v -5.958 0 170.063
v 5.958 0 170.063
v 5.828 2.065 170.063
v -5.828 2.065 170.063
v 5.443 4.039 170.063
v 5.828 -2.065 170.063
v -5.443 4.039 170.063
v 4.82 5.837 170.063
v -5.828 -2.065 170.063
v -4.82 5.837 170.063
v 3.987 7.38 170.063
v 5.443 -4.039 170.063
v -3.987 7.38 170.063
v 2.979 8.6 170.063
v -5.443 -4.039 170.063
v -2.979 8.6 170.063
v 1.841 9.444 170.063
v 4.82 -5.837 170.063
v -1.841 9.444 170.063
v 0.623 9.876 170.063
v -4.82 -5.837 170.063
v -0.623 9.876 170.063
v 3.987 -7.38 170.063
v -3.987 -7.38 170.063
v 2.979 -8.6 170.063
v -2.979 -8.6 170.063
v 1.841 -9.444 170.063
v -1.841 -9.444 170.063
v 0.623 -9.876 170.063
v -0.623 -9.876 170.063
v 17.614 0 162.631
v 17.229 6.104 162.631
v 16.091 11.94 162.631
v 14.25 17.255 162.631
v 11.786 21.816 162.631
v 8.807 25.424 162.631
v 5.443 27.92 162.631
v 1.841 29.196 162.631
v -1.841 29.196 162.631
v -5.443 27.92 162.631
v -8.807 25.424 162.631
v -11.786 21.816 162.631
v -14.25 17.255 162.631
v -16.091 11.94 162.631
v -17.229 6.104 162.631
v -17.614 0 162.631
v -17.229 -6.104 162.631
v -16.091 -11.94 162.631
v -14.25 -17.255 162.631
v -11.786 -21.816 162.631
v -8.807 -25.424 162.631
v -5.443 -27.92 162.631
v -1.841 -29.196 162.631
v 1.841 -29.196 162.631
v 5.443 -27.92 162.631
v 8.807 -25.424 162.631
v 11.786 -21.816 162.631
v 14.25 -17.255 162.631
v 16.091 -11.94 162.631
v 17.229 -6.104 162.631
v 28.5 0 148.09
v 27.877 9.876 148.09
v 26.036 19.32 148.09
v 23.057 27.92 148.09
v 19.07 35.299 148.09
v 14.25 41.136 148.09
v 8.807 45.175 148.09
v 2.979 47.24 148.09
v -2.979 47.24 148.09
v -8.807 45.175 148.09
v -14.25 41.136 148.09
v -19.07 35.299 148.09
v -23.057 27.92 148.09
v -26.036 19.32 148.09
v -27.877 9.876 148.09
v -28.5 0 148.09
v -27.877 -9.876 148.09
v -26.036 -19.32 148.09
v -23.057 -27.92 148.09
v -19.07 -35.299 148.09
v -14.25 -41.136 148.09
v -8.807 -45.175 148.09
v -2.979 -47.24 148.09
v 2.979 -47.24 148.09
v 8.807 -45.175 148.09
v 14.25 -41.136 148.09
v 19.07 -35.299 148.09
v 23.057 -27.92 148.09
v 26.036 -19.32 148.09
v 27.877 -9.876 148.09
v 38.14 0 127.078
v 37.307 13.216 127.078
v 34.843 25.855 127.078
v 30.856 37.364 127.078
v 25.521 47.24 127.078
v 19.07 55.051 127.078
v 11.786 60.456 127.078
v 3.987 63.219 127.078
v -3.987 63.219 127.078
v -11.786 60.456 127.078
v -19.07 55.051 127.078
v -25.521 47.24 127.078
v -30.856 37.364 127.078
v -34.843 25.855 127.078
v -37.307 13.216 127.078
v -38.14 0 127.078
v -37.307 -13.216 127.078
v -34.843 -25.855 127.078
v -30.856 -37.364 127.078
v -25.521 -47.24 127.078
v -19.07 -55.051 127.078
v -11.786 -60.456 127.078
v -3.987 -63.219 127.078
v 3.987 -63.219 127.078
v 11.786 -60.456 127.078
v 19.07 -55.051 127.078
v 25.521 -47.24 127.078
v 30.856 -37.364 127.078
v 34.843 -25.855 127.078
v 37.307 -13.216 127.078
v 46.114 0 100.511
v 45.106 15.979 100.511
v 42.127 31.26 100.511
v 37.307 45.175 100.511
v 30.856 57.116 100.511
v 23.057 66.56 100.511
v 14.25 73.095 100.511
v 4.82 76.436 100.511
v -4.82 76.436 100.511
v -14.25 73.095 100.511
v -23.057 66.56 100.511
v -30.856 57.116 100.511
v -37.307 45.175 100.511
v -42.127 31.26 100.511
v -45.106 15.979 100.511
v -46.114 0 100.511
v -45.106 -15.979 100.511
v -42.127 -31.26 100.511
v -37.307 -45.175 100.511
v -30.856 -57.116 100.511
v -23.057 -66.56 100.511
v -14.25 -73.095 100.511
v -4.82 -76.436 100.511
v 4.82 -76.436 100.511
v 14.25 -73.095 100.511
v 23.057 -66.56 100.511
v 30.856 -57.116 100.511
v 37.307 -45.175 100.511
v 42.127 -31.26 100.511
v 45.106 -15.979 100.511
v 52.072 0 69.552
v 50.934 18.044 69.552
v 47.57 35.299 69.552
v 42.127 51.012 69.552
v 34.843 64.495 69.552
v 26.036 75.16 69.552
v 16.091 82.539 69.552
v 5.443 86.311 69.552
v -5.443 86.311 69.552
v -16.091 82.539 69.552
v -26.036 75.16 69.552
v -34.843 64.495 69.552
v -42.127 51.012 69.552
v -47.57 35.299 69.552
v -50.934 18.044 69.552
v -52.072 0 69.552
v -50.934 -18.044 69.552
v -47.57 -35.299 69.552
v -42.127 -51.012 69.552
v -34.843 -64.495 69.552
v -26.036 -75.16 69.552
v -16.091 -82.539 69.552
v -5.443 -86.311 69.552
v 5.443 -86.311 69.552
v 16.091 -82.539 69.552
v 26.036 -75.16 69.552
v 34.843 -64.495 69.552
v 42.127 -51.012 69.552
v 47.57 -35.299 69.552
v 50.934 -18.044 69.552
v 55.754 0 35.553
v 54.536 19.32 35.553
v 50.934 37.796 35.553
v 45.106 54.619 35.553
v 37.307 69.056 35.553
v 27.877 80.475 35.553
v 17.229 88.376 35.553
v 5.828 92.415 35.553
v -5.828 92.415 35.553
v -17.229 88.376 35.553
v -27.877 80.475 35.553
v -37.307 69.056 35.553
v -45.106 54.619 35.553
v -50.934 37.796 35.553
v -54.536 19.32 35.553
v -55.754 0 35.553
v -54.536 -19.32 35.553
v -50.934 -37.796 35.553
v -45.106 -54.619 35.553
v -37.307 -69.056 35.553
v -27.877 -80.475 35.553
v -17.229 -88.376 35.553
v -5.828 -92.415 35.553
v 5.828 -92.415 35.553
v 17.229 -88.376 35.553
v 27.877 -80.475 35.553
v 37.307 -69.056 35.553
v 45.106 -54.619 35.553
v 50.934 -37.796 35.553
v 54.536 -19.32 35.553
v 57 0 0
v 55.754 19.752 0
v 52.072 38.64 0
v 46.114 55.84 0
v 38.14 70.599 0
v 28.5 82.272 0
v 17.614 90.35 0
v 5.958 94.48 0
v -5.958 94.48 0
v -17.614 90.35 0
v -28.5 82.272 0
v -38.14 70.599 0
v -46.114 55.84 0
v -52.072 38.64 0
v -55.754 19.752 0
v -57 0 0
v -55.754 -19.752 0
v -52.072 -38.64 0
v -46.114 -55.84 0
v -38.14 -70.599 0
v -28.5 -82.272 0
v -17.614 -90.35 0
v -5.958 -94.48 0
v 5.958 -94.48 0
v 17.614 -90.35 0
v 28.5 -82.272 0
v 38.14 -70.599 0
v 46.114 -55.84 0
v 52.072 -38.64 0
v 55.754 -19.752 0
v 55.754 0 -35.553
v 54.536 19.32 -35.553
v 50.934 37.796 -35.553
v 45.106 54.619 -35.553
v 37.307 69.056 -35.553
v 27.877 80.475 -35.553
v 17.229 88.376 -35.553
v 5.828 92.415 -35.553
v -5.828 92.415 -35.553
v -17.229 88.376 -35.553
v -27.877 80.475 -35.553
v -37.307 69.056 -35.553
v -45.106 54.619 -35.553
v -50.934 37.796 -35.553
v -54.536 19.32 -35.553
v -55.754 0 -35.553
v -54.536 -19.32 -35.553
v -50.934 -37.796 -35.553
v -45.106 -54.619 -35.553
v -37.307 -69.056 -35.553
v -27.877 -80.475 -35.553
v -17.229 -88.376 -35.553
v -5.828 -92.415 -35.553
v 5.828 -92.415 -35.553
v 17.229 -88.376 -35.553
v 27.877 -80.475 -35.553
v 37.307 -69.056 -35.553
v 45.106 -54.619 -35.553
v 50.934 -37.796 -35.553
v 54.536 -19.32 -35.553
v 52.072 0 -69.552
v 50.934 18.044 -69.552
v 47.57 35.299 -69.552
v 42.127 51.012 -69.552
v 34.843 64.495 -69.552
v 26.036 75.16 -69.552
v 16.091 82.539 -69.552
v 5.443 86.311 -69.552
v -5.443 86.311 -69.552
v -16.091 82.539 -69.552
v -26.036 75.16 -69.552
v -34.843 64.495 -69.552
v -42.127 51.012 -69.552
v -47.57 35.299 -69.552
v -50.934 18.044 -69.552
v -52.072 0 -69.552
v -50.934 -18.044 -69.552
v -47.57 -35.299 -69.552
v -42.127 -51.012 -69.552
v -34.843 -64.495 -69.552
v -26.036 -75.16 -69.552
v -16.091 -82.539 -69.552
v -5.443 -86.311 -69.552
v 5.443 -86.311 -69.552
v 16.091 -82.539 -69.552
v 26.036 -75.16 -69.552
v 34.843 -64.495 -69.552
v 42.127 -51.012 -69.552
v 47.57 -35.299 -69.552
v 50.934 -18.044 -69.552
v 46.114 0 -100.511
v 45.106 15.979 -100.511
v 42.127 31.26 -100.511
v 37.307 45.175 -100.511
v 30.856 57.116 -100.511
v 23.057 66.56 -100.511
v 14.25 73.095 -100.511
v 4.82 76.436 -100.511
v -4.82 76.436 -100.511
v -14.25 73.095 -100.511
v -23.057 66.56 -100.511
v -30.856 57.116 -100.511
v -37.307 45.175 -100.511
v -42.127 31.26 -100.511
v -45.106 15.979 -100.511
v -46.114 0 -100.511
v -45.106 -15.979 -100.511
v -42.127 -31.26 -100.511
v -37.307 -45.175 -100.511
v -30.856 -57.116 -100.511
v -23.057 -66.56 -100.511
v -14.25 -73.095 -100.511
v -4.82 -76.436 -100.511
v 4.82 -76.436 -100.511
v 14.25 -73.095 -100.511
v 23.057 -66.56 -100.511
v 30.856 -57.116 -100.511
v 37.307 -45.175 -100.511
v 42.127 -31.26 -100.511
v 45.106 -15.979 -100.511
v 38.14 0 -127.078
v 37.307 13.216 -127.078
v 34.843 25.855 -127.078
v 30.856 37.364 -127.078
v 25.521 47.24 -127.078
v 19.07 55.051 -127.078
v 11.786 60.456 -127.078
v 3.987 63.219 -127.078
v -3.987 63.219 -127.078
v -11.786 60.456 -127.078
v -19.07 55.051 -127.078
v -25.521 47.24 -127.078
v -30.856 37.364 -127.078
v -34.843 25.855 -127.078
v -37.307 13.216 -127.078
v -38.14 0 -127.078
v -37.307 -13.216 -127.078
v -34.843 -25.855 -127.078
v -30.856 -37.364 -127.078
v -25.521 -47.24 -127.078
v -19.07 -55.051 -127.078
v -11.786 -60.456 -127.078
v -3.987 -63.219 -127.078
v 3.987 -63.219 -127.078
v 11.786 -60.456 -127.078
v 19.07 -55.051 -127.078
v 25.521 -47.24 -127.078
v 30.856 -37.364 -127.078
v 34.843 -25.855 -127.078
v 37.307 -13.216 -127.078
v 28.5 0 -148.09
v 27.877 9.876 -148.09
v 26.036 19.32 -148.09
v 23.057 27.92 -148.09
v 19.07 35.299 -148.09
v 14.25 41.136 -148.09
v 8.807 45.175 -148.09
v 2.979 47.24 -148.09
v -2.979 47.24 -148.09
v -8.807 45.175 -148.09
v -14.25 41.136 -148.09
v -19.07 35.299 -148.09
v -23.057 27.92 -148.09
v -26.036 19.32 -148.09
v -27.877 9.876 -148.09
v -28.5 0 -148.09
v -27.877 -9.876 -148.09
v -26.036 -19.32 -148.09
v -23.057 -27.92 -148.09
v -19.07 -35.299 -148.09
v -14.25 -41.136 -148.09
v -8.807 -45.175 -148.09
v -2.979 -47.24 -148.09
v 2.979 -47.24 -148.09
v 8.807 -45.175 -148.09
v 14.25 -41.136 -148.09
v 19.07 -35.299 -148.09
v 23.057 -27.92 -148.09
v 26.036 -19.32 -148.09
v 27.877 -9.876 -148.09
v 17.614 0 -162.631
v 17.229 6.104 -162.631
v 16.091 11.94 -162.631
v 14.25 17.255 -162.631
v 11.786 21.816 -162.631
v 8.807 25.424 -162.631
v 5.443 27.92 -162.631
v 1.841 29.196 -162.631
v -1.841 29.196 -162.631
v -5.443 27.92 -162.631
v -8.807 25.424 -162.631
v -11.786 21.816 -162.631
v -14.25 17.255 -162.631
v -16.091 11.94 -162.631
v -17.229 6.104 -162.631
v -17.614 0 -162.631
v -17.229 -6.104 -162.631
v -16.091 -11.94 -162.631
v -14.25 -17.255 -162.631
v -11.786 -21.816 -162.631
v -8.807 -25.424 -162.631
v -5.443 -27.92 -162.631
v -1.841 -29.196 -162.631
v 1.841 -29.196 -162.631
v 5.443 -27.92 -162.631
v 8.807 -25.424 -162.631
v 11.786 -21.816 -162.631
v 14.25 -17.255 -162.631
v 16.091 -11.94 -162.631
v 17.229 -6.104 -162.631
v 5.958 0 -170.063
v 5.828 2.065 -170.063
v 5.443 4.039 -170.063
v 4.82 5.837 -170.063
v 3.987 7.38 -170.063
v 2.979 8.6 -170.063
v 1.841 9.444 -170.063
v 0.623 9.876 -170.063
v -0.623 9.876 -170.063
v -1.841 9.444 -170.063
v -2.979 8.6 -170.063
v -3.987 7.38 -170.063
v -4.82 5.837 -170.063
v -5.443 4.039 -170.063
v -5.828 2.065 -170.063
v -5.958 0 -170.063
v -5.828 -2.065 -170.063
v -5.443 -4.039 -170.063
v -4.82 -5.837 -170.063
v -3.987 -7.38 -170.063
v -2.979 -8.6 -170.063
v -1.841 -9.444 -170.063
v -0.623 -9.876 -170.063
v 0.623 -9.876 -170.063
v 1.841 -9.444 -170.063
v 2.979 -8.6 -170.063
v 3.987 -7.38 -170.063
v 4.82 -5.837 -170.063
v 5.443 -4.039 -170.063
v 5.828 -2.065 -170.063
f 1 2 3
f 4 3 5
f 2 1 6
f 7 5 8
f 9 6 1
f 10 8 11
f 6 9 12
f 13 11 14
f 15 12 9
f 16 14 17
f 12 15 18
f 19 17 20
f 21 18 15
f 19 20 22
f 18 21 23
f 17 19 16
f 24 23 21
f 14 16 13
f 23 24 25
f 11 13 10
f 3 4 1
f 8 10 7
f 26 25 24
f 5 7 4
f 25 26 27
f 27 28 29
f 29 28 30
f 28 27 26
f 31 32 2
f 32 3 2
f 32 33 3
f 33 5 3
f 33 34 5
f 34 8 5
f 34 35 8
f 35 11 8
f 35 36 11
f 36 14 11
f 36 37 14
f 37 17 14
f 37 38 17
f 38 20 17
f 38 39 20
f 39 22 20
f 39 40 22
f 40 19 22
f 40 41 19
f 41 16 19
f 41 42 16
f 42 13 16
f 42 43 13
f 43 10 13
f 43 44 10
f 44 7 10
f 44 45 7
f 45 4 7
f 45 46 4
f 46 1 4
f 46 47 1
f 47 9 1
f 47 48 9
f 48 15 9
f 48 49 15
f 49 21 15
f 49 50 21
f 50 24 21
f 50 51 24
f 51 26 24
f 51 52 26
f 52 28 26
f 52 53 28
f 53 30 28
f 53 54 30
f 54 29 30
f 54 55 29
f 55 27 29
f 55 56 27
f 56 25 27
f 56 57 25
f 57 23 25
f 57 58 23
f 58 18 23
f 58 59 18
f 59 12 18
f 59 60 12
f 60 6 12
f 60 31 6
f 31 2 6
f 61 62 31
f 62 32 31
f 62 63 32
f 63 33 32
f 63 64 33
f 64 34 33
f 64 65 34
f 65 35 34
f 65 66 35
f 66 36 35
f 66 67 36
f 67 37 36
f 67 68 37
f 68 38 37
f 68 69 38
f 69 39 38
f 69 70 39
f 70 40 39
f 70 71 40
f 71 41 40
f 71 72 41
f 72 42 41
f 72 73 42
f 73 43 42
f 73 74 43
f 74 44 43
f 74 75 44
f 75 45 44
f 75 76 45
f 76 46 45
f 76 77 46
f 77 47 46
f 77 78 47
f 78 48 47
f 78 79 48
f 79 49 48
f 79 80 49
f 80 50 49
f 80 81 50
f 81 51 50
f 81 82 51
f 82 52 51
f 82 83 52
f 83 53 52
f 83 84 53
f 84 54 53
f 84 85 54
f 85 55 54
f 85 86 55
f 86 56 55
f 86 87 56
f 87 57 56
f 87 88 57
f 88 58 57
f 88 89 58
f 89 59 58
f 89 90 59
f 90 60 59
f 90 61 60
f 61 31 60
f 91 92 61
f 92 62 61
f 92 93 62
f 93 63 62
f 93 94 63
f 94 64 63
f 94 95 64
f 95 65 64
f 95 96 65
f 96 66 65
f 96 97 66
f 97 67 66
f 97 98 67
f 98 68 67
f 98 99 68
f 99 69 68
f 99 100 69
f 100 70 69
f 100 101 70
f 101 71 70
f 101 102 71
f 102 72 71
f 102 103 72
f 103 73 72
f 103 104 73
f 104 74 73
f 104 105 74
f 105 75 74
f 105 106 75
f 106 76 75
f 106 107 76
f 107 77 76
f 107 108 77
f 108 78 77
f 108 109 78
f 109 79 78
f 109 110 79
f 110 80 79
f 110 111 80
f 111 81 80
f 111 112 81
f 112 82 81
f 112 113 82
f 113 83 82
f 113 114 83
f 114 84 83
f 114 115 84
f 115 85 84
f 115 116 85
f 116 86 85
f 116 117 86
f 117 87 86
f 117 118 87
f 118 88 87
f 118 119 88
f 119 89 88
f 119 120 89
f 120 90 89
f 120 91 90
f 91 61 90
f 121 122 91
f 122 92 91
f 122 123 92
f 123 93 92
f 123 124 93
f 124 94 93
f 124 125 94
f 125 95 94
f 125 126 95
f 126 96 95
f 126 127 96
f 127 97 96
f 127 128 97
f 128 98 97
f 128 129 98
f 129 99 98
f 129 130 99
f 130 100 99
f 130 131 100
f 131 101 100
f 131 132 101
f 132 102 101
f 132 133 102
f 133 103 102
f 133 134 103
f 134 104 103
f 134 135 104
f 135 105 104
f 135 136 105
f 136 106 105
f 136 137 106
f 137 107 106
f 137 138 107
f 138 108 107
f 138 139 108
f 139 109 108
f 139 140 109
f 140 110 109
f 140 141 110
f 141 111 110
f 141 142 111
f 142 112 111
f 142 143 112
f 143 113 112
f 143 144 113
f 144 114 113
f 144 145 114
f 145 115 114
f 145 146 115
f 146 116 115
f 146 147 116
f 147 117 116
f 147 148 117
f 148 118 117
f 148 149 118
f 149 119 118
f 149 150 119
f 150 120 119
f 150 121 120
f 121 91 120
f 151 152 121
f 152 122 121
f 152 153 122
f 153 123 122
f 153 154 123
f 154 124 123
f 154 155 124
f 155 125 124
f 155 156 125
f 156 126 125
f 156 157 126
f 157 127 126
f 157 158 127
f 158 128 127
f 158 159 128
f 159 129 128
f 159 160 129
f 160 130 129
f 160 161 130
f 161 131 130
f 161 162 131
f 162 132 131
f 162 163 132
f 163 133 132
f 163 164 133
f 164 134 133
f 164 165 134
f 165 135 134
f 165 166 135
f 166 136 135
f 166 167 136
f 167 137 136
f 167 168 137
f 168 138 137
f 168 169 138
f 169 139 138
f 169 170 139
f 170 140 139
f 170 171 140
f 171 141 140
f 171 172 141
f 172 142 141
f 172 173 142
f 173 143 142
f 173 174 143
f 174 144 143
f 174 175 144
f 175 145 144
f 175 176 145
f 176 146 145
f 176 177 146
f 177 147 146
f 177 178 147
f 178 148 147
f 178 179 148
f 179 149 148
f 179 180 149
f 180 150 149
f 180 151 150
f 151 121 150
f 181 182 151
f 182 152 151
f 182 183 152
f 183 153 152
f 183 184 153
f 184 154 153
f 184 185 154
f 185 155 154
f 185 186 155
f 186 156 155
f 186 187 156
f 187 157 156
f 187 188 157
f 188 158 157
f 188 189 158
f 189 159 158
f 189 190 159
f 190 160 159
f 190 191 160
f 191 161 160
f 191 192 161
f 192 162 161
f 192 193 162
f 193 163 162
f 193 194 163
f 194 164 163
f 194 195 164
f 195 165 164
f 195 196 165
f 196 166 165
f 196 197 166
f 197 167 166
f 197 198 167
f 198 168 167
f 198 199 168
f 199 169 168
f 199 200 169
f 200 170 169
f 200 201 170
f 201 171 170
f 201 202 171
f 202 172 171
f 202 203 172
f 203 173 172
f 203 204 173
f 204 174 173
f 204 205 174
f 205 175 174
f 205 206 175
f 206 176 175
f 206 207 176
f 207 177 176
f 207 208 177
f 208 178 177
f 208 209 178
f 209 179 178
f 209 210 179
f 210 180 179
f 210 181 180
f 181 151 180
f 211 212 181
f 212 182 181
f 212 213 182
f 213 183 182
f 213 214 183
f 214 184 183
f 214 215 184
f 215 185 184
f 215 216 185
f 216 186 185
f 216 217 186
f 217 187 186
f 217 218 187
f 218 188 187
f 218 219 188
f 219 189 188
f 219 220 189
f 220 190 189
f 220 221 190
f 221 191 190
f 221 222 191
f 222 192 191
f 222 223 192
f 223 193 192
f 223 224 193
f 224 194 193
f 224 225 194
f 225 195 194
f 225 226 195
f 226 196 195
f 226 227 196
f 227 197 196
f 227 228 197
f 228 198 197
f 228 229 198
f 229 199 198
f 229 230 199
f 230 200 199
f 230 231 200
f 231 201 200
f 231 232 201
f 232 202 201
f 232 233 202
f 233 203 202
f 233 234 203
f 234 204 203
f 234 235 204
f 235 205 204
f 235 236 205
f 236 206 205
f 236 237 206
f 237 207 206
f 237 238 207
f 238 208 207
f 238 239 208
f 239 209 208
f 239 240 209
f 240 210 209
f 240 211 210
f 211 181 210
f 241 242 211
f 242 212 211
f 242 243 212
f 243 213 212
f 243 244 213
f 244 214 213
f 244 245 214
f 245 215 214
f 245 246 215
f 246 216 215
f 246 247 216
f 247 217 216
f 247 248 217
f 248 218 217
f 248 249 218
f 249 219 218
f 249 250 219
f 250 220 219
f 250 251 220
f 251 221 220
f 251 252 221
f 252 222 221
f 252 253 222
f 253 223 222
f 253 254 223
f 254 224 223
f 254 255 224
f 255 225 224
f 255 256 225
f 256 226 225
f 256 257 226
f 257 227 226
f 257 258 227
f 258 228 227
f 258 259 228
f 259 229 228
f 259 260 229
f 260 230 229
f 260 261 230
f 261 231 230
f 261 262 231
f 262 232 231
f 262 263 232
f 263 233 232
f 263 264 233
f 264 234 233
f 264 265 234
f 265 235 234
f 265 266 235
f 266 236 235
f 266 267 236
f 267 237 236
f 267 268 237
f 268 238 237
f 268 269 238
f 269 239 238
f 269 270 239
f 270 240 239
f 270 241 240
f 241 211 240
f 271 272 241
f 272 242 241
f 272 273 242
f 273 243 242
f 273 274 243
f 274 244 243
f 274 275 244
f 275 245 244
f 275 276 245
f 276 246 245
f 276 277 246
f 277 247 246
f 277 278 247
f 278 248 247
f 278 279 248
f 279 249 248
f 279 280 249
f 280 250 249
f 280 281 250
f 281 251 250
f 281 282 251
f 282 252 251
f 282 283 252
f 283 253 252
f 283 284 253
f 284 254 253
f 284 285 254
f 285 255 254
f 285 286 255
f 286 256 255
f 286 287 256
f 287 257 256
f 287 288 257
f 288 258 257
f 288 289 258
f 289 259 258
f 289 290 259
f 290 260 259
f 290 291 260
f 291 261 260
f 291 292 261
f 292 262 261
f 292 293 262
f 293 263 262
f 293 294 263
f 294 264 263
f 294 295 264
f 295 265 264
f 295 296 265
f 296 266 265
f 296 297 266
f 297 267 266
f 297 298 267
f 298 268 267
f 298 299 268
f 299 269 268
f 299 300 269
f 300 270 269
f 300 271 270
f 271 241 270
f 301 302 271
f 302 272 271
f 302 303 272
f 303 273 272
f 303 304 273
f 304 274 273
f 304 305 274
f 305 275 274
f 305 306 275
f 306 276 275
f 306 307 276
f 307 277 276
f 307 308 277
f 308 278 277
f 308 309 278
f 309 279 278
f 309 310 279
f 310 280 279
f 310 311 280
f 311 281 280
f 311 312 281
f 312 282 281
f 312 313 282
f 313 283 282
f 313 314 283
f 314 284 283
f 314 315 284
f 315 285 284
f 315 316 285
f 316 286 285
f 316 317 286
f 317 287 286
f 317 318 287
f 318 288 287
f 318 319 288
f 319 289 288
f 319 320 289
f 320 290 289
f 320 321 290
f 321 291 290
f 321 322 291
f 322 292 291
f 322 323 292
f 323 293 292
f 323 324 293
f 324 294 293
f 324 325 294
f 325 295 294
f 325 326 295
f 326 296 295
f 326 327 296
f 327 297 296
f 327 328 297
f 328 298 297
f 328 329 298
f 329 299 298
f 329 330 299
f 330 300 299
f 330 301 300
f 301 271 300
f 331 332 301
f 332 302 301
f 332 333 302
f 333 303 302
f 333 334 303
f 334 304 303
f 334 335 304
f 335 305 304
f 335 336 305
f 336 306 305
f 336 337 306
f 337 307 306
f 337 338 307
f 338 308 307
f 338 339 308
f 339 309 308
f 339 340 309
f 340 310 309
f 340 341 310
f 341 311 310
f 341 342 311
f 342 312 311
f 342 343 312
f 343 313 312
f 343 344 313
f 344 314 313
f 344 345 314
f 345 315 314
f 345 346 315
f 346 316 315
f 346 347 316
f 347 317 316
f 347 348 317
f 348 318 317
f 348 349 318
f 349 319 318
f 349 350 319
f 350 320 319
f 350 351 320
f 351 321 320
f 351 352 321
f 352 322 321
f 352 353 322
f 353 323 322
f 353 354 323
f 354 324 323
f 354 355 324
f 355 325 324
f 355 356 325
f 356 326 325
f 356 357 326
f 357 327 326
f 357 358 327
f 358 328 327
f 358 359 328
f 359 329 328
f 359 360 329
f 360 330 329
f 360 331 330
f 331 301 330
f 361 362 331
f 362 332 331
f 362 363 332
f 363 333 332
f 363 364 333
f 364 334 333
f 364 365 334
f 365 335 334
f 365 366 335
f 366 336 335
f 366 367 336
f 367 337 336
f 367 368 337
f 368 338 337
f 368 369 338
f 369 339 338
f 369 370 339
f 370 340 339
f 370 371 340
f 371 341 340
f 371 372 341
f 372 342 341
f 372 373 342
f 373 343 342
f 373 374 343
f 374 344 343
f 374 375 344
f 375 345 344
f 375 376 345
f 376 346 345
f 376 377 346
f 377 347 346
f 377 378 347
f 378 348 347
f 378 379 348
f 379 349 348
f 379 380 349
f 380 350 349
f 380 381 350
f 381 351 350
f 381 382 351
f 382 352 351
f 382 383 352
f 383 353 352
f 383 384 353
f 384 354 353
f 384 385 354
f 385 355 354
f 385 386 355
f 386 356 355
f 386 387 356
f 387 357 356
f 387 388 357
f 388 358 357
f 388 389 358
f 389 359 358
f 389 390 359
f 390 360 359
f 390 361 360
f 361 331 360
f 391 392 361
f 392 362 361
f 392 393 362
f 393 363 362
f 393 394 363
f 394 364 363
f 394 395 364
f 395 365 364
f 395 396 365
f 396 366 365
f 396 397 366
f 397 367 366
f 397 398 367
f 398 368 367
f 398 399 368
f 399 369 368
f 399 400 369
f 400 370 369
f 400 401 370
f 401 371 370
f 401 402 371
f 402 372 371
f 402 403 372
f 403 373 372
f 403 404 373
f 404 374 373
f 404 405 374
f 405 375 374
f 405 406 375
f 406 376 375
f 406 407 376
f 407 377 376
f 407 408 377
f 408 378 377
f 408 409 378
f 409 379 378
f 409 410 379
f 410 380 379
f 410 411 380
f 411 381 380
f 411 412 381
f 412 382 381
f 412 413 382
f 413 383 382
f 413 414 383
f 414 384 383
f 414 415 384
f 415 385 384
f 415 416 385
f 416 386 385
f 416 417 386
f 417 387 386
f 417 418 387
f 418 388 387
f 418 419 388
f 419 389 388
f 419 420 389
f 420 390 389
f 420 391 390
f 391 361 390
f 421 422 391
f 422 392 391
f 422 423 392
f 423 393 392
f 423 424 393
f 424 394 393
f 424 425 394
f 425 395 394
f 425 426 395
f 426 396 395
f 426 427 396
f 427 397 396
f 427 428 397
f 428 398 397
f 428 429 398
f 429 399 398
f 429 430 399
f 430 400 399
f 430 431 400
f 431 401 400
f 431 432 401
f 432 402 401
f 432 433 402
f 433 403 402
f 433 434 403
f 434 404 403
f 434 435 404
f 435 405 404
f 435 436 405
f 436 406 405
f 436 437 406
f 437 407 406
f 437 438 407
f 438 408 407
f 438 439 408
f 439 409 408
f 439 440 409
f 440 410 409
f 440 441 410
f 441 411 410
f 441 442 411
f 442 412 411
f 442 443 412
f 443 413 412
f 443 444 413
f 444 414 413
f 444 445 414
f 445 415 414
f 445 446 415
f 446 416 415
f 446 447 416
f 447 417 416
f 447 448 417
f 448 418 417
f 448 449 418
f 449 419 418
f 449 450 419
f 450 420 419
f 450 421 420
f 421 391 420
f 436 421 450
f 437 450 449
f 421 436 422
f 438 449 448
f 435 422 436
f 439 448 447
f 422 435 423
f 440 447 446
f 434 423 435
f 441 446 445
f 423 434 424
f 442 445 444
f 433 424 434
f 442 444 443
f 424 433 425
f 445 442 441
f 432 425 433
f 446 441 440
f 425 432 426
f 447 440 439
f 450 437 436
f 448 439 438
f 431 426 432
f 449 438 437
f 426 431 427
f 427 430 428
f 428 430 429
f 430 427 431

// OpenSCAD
// Generated by SolidPython 1.0.1 on 2020-07-29 00:39:25


scale(v = [3, 5, 9]) {
	sphere(r = 19);
}
/***********************************************
*********      SolidPython code:      **********
************************************************
 
# import packages: SolidPython
from solid import *
from solid.utils import *
from itertools import chain, combinations


class Resize:

    def __init__(self, scad_file):
        self.scad_file = scad_file
        #self.scad_file = import_scad(scad_file)
        # cone/cylinder param:
        self.r1 = 0
        self.r2 = 0
        self.h = 0
        # rectangular prism param:
        self.w = 0
        self.l = 0
        # ellipse param:
        self.r = 0

    # import OpenScad code (file name corresponds to shape)


    # classify shape + parameters
    def assign(self, param1, param2, param3):
        if self.scad_file == 'cone.scad':
            self.r1 = param1
            self.r2 = param2
            self.h = param3
        elif self.scad_file == 'cylinder.scad':
            self.r1 = param1
            self.r2 = param2
            self.h = param3
        elif self.scad_file == 'rectangularPrism.scad':
            self.h = param1
            self.l = param2
            self.w = param3
        else:
            self.r = param1
            self.h = param2

    # resize parameters
    def iterate(self):
        x = range(3, 20, 2)
        i = 1
        if self.scad_file == 'cone.scad':
            tempList = list(combinations(x, 2))
            for temp in tempList:
                param1 = temp[0]
                param2 = temp[1]
                filepath = 'produced_scad_files/' + 'cone' + str(param1) + '_' + str(param2) + '_' + '.scad'
                scad_render_to_file(cylinder(h=param1, r1=param2, r2=0), filepath)

        elif self.scad_file == 'cylinder.scad':
            tempList = list(combinations(x, 3))
            for temp in tempList:
                param1 = temp[0]
                param2 = temp[1]
                filepath = 'produced_scad_files/' + 'cylinder' + str(param1) + '_' + str(param2) + '_' + '.scad'
                scad_render_to_file(cylinder(h=param1, r1=param2, r2=param2), filepath)

        elif self.scad_file == 'rectangularPrism.scad':
            tempList = list(combinations(x, 3))
            for temp in tempList:
                param1 = temp[0]
                param2 = temp[1]
                param3 = temp[2]
                filepath = 'produced_scad_files/' + 'rectangularPrism' + str(param1) + '_' + str(param2) + '_' + str(
                    param3) + '.scad'
                scad_render_to_file(cube(size=(param1, param2, param3)), filepath)

        elif self.scad_file == 'ellipse.scad':
            tempList = list(combinations(x, 4))
            for temp in tempList:
                param1 = temp[0]
                param2 = temp[1]
                param3 = temp[2]
                param4 = temp[3]
                filepath = 'produced_scad_files/' + 'ellipse' + str(param1) + '_' + str(param2) + '_' + str(param3) + '_' + str(param4) + '.scad'
                scad_render_to_file(scale([param1, param2, param3])(sphere(r=param4)), filepath)

    def render_to_scadfile(self):
        scad_render_to_file(scad, 'example.scad') 
 
************************************************/
